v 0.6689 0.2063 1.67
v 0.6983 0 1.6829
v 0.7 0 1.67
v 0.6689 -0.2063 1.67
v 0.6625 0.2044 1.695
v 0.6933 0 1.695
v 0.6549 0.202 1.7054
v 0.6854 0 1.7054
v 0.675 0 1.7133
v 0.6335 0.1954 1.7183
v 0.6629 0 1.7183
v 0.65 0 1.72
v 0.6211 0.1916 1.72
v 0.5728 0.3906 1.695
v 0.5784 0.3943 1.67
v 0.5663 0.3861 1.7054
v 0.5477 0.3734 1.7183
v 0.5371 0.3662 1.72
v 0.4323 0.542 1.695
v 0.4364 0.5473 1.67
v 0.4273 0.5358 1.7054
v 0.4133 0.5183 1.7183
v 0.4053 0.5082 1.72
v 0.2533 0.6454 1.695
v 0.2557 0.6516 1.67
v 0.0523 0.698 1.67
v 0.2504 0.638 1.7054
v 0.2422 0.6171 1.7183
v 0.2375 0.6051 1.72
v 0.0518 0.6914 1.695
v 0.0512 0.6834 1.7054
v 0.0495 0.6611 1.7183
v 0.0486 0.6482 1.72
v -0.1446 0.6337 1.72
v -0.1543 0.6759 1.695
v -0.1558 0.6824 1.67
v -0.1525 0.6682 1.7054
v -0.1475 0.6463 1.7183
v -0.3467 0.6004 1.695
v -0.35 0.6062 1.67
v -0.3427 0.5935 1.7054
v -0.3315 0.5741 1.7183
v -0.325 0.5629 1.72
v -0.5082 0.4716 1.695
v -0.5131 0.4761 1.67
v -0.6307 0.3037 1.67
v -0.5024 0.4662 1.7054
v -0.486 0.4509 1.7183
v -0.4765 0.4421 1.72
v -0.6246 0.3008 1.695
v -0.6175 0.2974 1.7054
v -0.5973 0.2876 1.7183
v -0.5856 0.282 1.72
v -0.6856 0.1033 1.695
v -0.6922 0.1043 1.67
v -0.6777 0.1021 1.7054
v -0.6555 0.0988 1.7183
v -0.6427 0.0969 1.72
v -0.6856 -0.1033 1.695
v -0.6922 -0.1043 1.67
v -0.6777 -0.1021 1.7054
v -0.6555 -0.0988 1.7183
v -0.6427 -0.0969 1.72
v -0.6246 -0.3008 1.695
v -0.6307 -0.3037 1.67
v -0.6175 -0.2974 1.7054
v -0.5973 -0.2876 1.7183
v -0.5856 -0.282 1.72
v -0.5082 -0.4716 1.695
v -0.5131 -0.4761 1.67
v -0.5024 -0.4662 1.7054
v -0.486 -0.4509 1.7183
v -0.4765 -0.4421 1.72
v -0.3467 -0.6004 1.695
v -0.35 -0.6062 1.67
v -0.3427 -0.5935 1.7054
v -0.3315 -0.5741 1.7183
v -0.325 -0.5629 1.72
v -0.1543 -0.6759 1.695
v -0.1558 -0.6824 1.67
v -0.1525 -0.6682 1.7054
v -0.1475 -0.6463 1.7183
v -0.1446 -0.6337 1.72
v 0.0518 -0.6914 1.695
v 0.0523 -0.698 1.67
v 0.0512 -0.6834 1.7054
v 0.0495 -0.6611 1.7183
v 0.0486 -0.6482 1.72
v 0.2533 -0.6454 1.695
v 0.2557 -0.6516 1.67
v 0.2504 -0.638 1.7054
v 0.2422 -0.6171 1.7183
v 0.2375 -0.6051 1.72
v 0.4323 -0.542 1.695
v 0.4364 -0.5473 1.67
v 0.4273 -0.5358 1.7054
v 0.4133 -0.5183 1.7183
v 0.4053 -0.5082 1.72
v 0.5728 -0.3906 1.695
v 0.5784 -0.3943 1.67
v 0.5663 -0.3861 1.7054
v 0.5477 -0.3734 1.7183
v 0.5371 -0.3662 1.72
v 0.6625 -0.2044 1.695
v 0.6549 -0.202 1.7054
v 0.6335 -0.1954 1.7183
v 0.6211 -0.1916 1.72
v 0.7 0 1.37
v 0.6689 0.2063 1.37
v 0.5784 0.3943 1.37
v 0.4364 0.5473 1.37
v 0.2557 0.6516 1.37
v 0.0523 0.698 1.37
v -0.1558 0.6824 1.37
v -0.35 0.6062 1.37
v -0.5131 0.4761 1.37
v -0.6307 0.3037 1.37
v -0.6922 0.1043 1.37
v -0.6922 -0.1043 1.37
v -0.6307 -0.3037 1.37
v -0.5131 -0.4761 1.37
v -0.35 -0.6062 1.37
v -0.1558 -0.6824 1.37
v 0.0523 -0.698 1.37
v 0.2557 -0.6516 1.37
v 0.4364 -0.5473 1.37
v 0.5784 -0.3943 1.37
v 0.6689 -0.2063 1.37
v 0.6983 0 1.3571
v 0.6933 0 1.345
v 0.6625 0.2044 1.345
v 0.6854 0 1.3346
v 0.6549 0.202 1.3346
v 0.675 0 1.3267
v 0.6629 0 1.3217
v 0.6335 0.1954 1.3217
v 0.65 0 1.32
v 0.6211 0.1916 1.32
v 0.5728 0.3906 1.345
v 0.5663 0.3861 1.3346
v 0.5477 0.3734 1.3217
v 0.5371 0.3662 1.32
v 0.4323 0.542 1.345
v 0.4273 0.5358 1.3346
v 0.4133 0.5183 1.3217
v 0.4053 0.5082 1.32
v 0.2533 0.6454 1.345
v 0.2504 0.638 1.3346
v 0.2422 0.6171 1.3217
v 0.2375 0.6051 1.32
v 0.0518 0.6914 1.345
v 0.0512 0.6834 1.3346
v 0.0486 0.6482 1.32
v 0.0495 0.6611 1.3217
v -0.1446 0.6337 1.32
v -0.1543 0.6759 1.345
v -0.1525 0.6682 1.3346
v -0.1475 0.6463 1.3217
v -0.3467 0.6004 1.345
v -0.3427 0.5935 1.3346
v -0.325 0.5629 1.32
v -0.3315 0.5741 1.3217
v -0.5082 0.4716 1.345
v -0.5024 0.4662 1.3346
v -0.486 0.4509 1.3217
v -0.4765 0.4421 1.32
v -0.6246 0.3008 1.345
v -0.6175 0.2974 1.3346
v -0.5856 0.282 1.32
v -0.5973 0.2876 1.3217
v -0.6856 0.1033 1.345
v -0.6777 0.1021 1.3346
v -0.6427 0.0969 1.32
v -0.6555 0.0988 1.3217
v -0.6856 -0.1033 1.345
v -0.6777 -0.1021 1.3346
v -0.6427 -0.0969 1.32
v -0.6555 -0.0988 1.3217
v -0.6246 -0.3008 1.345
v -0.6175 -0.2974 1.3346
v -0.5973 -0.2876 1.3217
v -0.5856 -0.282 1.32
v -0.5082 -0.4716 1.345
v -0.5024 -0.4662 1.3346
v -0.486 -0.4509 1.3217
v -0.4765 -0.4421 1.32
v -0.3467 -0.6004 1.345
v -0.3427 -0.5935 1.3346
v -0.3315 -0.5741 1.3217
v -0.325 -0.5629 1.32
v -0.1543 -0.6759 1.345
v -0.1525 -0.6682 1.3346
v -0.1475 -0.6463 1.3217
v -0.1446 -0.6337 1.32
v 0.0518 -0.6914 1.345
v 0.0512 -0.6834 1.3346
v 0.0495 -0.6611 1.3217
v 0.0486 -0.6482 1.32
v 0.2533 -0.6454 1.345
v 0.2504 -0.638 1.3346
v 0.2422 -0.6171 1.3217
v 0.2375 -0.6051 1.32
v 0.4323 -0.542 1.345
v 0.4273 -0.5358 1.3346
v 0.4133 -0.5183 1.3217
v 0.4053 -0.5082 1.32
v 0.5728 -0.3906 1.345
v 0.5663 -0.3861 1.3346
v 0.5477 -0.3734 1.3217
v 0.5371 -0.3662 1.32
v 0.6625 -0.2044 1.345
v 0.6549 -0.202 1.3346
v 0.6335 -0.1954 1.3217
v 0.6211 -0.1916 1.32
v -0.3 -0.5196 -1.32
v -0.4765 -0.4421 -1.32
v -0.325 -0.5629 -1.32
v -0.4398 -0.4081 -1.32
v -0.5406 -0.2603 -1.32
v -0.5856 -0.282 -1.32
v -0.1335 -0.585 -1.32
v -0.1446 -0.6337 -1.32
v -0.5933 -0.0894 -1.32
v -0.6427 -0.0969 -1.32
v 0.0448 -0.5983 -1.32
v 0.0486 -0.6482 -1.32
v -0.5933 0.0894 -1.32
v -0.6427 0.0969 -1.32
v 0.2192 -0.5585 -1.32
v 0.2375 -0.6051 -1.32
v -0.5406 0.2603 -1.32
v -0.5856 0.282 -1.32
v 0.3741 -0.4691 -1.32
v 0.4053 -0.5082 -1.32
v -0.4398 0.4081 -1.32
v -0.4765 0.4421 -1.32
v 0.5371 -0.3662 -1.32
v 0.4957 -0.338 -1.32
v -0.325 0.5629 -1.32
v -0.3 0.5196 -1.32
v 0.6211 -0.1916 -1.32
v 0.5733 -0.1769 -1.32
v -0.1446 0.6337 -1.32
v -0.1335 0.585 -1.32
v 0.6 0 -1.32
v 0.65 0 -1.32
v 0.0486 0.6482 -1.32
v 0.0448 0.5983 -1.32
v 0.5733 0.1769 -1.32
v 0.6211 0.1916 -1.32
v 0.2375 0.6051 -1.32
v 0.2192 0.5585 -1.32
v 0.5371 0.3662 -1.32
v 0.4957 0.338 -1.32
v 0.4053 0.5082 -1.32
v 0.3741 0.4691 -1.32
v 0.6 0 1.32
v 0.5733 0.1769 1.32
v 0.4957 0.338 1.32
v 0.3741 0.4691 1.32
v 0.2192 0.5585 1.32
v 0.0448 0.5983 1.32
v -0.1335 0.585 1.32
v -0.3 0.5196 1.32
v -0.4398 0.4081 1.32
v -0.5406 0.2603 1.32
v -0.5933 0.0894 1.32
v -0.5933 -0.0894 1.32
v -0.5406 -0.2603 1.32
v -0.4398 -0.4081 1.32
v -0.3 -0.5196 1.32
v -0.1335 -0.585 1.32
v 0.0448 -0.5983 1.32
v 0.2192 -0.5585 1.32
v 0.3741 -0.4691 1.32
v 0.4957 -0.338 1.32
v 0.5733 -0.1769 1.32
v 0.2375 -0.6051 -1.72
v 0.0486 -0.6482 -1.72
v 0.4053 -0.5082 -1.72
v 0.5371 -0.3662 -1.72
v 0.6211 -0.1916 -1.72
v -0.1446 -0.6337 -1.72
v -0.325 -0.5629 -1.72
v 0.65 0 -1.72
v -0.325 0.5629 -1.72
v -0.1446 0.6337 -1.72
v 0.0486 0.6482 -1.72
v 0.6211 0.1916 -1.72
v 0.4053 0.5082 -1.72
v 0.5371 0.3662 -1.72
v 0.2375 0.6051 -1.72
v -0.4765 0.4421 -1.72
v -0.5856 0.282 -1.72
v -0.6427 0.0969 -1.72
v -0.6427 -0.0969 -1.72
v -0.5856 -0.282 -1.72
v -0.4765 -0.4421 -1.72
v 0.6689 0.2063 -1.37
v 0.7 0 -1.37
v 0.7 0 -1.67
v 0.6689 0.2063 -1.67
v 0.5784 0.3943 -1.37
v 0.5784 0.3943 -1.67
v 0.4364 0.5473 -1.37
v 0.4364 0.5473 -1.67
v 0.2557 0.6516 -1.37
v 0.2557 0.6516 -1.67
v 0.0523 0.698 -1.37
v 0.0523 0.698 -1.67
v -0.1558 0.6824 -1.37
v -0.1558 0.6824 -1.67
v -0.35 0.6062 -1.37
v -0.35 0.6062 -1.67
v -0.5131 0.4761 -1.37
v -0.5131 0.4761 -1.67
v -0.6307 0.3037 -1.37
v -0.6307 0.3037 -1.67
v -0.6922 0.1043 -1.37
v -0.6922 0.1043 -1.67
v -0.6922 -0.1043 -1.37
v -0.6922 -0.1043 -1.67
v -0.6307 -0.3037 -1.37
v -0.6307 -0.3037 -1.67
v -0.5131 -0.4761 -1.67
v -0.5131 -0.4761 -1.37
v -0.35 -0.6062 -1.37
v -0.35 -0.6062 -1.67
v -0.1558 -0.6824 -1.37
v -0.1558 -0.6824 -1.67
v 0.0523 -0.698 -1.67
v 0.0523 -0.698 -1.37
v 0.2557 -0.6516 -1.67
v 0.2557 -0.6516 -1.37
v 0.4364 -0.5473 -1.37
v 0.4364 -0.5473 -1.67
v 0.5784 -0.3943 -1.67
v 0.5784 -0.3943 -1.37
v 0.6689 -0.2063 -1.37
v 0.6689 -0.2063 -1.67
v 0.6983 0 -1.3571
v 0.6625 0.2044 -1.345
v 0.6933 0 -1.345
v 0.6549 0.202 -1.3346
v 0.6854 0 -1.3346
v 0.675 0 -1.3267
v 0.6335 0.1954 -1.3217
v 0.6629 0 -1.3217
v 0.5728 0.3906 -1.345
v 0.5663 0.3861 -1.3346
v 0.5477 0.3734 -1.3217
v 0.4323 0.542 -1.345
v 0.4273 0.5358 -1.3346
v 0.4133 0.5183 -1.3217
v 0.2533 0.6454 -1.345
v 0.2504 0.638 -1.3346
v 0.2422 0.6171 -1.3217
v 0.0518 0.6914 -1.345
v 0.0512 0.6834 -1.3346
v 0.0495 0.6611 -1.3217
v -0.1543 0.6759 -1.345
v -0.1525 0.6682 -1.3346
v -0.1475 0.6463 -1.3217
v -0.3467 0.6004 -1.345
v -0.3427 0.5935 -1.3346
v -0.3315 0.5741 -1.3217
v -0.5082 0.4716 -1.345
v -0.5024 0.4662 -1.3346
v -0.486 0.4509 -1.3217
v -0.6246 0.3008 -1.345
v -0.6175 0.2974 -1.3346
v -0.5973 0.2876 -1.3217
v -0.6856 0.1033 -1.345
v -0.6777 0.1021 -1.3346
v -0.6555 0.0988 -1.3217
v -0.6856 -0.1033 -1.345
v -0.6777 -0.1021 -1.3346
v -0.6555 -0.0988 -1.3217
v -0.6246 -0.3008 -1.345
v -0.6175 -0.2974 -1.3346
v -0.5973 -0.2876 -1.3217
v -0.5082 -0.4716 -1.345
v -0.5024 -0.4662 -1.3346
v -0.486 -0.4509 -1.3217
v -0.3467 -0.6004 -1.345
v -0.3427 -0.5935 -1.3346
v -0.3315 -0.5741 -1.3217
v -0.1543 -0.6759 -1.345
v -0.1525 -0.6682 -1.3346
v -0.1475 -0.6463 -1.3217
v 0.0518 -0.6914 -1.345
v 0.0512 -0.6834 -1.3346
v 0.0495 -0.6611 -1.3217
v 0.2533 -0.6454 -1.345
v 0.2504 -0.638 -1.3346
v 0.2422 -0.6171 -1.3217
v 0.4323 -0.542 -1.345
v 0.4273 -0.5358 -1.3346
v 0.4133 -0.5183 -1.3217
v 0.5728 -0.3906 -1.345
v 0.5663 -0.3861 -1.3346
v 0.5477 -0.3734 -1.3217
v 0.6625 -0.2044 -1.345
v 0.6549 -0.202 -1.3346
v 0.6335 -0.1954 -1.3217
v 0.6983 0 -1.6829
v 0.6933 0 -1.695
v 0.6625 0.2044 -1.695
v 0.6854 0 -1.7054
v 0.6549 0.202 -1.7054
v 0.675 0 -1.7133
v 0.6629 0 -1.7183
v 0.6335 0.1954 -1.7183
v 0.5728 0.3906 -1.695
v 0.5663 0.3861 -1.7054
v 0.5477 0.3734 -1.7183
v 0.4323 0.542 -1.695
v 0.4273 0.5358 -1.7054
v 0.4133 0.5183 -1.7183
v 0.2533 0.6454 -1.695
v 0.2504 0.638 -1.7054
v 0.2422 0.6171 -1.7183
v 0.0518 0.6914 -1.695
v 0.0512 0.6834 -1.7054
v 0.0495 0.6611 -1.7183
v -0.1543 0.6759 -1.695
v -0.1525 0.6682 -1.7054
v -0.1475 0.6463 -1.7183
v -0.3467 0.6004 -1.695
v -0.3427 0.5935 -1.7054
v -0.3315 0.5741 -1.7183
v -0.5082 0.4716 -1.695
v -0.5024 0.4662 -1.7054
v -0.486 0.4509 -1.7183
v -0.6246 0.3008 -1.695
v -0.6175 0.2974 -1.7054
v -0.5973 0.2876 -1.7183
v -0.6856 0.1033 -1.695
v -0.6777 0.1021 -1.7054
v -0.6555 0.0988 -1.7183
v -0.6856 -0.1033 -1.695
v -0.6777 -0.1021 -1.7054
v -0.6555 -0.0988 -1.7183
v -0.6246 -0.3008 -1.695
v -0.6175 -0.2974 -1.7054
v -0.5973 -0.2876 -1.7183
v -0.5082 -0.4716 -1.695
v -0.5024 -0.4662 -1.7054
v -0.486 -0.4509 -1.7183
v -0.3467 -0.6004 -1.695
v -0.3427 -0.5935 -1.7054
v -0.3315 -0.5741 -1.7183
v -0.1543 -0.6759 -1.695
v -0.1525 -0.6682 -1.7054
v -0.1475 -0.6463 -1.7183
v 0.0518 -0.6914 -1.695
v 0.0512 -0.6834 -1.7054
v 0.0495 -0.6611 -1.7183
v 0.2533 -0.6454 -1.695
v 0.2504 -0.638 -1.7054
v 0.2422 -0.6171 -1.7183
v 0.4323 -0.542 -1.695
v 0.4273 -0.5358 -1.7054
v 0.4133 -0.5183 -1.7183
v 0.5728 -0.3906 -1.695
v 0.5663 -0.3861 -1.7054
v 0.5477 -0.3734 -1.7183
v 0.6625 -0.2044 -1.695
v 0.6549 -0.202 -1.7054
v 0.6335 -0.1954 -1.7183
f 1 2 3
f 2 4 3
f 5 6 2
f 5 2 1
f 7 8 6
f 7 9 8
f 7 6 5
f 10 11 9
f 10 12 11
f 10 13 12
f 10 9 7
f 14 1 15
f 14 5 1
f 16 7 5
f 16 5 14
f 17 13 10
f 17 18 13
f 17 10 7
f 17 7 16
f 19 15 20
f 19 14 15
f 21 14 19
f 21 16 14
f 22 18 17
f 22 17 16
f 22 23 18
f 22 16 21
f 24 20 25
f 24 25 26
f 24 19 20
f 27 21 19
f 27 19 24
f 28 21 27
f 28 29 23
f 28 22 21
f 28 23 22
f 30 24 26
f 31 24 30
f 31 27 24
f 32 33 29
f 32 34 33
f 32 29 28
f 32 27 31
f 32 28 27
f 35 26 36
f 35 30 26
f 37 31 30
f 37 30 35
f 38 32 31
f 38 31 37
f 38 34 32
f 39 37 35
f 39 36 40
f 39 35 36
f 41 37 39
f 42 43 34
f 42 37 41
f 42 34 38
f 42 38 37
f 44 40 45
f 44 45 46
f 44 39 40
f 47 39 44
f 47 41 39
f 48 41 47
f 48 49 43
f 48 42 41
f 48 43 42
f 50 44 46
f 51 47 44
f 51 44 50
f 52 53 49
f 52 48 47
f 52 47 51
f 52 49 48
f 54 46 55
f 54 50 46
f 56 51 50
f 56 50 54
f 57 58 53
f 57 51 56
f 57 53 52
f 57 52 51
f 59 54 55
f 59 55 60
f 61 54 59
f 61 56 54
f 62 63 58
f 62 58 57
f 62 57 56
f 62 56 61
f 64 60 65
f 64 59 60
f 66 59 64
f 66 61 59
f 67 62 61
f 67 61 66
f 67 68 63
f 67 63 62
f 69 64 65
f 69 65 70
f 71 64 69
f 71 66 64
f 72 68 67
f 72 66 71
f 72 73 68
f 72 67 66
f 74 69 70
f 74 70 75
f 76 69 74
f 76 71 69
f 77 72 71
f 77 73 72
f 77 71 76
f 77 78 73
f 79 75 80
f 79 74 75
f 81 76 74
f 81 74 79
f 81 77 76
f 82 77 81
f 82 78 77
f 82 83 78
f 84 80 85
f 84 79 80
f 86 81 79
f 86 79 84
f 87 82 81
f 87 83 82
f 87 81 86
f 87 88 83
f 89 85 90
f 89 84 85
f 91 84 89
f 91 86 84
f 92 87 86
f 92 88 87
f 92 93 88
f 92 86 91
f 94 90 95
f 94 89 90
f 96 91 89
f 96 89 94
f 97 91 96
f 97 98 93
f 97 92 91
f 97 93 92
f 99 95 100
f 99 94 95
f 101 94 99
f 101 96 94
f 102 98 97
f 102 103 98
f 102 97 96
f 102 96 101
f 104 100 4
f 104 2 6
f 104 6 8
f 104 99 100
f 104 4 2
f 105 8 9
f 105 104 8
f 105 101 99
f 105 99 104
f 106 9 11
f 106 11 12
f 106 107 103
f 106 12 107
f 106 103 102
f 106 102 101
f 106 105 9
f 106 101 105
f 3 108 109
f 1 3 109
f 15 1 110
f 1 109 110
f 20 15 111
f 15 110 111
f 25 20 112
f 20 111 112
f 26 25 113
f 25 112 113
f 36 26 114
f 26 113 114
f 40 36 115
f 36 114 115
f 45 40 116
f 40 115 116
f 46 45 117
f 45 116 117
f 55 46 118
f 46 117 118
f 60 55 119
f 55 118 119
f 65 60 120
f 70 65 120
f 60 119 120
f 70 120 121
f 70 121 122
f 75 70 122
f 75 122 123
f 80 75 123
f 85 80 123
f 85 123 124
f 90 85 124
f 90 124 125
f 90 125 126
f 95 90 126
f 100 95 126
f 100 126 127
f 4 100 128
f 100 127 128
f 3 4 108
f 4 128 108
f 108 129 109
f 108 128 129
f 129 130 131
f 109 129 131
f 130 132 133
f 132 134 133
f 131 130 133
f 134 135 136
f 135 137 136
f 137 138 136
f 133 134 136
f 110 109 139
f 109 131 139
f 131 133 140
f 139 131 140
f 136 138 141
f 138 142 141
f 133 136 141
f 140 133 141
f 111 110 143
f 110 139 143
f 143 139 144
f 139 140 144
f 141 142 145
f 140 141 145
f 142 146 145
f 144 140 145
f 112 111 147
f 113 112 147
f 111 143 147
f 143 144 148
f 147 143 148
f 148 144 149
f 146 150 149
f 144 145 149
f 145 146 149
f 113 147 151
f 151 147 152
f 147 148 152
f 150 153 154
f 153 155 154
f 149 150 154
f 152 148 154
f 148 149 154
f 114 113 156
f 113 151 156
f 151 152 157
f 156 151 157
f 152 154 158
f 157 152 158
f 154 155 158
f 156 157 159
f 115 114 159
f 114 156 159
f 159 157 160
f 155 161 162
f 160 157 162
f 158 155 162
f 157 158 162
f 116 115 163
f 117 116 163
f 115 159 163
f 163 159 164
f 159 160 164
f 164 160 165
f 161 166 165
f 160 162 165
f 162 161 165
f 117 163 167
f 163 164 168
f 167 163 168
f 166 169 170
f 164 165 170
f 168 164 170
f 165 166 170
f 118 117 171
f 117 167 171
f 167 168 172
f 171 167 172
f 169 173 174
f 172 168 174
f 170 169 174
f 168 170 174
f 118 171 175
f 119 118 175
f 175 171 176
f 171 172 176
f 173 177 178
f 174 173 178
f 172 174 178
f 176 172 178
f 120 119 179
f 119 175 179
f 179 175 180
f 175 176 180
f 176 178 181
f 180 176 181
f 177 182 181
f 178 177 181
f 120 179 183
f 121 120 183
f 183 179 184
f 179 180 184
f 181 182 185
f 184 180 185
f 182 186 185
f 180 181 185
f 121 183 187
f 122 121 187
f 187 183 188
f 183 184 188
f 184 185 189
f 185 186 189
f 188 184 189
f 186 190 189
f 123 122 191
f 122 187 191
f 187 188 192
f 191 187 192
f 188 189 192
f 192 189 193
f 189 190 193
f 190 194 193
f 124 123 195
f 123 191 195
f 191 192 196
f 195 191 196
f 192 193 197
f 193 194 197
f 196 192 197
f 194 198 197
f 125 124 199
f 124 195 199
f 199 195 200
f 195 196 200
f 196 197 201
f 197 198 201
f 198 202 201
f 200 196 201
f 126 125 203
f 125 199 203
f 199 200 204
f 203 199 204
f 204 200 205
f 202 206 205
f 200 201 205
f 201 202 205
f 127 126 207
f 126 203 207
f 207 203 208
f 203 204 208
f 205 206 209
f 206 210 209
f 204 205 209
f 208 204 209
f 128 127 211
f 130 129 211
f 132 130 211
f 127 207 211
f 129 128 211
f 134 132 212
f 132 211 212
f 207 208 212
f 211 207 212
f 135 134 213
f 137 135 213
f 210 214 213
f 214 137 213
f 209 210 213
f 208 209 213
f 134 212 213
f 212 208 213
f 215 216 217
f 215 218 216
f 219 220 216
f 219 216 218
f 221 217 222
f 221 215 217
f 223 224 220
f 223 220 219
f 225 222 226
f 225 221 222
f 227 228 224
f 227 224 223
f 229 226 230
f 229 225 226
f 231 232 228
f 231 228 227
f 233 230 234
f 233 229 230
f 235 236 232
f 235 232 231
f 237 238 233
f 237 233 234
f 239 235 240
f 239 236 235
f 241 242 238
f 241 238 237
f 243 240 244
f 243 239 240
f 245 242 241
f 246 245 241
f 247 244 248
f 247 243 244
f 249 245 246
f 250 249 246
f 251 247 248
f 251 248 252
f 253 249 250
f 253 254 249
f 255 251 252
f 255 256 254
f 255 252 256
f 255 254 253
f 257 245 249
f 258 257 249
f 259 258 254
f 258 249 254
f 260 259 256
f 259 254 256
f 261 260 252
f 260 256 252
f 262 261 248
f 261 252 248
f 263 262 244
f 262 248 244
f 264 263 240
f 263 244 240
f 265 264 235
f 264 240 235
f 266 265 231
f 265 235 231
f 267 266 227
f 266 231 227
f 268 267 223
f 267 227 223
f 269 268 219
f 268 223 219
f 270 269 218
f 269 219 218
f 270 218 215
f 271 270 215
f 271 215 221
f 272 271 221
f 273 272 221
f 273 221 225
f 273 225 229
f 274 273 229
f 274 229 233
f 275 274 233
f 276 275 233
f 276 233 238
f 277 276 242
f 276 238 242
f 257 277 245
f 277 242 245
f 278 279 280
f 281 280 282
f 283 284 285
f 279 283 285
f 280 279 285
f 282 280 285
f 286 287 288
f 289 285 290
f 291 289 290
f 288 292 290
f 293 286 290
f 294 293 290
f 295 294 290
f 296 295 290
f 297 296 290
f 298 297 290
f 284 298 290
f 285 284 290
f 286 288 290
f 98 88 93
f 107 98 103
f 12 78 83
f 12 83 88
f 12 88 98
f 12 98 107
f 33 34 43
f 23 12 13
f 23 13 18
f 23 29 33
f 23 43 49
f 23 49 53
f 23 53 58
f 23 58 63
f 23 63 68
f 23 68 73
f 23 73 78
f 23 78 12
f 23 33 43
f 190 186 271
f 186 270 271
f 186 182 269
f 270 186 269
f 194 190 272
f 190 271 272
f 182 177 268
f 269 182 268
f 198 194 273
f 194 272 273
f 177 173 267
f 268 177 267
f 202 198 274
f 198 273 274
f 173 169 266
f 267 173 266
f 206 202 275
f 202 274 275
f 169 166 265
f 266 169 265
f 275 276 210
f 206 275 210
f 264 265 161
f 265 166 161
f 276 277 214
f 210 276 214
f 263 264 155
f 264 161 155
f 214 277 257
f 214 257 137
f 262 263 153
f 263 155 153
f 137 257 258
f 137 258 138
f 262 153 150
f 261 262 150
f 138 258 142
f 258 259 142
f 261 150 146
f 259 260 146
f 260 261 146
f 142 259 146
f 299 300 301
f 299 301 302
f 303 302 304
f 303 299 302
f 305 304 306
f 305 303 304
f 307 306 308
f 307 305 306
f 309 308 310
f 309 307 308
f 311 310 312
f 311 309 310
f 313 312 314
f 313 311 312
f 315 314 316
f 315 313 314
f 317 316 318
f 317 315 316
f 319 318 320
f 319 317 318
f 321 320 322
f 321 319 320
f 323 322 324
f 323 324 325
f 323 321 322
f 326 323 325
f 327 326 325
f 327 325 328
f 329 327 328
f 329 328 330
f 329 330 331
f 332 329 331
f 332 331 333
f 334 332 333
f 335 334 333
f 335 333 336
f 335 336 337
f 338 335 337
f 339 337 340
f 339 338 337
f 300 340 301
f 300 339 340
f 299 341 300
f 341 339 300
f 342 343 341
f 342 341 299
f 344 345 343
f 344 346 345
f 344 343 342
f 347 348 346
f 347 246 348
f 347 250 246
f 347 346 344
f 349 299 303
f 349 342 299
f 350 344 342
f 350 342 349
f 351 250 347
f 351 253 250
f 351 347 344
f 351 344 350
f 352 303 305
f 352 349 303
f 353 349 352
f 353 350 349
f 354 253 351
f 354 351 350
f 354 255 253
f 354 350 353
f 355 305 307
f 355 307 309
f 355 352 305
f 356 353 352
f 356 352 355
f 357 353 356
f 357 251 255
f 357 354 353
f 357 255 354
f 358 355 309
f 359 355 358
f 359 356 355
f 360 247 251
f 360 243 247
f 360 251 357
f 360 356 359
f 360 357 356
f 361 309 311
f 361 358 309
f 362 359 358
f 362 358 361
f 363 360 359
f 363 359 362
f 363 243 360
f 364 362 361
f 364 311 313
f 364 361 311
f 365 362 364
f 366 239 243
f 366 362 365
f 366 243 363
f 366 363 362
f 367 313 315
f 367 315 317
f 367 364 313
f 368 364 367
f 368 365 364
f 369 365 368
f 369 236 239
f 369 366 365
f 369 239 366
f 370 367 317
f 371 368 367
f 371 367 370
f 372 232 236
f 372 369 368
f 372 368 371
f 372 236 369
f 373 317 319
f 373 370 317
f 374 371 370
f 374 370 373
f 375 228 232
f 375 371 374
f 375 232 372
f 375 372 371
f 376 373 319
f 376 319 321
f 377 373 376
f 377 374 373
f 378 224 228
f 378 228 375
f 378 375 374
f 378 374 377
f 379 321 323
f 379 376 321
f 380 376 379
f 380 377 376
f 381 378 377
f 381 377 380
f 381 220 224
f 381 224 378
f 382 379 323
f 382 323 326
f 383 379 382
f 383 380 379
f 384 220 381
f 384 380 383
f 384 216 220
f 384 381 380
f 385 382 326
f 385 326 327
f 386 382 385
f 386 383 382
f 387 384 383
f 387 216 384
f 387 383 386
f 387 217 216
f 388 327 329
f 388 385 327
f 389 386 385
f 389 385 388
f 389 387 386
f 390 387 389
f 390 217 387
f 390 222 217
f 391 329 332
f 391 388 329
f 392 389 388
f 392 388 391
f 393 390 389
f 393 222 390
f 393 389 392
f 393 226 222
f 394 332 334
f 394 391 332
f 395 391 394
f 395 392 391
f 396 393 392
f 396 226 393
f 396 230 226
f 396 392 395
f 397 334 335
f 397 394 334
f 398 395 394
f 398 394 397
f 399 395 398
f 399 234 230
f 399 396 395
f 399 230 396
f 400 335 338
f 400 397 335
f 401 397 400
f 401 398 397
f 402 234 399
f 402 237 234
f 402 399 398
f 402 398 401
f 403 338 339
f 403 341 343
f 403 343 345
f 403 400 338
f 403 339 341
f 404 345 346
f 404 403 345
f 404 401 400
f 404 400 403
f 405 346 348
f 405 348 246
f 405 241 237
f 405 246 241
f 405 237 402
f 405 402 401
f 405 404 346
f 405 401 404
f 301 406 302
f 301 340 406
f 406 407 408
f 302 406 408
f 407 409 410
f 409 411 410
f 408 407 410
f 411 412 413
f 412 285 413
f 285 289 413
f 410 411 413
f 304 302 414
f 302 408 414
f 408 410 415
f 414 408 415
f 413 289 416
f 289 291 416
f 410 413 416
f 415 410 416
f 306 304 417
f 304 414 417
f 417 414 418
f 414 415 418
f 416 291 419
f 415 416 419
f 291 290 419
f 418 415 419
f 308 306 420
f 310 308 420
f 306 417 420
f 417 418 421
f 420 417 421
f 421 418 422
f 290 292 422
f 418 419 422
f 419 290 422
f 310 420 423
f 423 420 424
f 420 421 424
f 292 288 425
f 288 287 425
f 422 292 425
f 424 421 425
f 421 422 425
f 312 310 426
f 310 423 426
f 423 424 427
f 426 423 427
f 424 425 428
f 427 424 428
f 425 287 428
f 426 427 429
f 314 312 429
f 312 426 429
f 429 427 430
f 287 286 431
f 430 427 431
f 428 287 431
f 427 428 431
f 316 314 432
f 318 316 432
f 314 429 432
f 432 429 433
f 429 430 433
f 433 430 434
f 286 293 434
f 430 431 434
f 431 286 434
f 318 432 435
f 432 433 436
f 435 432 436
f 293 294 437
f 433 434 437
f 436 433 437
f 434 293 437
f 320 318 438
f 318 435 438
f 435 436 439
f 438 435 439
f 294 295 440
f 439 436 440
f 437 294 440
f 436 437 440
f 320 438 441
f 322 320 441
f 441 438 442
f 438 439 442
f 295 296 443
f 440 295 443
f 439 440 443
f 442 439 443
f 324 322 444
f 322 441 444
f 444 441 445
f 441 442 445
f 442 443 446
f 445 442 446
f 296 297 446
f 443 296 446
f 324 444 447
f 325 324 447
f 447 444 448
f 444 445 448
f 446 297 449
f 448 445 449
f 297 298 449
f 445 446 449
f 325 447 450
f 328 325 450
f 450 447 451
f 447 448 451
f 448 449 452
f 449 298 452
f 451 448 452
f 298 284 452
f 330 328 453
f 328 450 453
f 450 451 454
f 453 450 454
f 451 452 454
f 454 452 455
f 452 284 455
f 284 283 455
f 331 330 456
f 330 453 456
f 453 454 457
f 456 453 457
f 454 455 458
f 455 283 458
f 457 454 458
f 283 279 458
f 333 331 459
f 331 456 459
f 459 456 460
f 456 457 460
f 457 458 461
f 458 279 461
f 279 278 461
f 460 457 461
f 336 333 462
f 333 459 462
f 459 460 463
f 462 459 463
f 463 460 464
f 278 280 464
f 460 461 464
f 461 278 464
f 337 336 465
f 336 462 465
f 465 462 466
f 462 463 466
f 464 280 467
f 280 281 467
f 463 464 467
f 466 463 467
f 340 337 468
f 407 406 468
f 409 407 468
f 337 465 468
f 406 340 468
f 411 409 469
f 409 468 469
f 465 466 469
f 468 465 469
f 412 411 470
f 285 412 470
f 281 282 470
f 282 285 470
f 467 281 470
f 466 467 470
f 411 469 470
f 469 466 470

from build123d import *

# Parameters (mm, degrees)
EXTRUS_O1_DEPTH        = 1.32
EXTRUS_O1_DEPTH_BACK   = 1.32
ESBO_O1_R              = 0.6
ESBO_O2_R              = 0.7
EXTRUS_O2_DEPTH        = 0.4
FILETE1_R              = 0.05
FILETE1_OF_ESPELHAR1_R = 0.05


with BuildPart() as part:
    # Esboço1 → Extrusão1 (new, two sides: drawn at the far end of the back side and taken through both)
    with BuildSketch(Plane.XY.offset(-EXTRUS_O1_DEPTH_BACK)):
        Circle(ESBO_O1_R)
    extrude(amount=EXTRUS_O1_DEPTH + EXTRUS_O1_DEPTH_BACK)

    # Esboço2 → Extrusão2 (add)
    with BuildSketch(Plane.XY.offset(1.32)):
        Circle(ESBO_O2_R)
    extrus_o2 = extrude(amount=EXTRUS_O2_DEPTH)

    # Filete1
    filete1_edges = [part.edges().sort_by_distance(p)[0] for p in [
        (-0.7, 0, 1.32),
        (-0.7, 0, 1.72),
    ]]
    fillet(filete1_edges, radius=FILETE1_R)

    # Espelhar1: Extrusão2 across plane
    add(extrus_o2.mirror(Plane.XY))

    # Filete1 of Espelhar1
    filete1_of_espelhar1_edges = [part.edges().sort_by_distance(p)[0] for p in [
        (-0.7, 0, -1.32),
        (-0.7, 0, -1.72),
    ]]
    fillet(filete1_of_espelhar1_edges, radius=FILETE1_OF_ESPELHAR1_R)


solid = part.part
